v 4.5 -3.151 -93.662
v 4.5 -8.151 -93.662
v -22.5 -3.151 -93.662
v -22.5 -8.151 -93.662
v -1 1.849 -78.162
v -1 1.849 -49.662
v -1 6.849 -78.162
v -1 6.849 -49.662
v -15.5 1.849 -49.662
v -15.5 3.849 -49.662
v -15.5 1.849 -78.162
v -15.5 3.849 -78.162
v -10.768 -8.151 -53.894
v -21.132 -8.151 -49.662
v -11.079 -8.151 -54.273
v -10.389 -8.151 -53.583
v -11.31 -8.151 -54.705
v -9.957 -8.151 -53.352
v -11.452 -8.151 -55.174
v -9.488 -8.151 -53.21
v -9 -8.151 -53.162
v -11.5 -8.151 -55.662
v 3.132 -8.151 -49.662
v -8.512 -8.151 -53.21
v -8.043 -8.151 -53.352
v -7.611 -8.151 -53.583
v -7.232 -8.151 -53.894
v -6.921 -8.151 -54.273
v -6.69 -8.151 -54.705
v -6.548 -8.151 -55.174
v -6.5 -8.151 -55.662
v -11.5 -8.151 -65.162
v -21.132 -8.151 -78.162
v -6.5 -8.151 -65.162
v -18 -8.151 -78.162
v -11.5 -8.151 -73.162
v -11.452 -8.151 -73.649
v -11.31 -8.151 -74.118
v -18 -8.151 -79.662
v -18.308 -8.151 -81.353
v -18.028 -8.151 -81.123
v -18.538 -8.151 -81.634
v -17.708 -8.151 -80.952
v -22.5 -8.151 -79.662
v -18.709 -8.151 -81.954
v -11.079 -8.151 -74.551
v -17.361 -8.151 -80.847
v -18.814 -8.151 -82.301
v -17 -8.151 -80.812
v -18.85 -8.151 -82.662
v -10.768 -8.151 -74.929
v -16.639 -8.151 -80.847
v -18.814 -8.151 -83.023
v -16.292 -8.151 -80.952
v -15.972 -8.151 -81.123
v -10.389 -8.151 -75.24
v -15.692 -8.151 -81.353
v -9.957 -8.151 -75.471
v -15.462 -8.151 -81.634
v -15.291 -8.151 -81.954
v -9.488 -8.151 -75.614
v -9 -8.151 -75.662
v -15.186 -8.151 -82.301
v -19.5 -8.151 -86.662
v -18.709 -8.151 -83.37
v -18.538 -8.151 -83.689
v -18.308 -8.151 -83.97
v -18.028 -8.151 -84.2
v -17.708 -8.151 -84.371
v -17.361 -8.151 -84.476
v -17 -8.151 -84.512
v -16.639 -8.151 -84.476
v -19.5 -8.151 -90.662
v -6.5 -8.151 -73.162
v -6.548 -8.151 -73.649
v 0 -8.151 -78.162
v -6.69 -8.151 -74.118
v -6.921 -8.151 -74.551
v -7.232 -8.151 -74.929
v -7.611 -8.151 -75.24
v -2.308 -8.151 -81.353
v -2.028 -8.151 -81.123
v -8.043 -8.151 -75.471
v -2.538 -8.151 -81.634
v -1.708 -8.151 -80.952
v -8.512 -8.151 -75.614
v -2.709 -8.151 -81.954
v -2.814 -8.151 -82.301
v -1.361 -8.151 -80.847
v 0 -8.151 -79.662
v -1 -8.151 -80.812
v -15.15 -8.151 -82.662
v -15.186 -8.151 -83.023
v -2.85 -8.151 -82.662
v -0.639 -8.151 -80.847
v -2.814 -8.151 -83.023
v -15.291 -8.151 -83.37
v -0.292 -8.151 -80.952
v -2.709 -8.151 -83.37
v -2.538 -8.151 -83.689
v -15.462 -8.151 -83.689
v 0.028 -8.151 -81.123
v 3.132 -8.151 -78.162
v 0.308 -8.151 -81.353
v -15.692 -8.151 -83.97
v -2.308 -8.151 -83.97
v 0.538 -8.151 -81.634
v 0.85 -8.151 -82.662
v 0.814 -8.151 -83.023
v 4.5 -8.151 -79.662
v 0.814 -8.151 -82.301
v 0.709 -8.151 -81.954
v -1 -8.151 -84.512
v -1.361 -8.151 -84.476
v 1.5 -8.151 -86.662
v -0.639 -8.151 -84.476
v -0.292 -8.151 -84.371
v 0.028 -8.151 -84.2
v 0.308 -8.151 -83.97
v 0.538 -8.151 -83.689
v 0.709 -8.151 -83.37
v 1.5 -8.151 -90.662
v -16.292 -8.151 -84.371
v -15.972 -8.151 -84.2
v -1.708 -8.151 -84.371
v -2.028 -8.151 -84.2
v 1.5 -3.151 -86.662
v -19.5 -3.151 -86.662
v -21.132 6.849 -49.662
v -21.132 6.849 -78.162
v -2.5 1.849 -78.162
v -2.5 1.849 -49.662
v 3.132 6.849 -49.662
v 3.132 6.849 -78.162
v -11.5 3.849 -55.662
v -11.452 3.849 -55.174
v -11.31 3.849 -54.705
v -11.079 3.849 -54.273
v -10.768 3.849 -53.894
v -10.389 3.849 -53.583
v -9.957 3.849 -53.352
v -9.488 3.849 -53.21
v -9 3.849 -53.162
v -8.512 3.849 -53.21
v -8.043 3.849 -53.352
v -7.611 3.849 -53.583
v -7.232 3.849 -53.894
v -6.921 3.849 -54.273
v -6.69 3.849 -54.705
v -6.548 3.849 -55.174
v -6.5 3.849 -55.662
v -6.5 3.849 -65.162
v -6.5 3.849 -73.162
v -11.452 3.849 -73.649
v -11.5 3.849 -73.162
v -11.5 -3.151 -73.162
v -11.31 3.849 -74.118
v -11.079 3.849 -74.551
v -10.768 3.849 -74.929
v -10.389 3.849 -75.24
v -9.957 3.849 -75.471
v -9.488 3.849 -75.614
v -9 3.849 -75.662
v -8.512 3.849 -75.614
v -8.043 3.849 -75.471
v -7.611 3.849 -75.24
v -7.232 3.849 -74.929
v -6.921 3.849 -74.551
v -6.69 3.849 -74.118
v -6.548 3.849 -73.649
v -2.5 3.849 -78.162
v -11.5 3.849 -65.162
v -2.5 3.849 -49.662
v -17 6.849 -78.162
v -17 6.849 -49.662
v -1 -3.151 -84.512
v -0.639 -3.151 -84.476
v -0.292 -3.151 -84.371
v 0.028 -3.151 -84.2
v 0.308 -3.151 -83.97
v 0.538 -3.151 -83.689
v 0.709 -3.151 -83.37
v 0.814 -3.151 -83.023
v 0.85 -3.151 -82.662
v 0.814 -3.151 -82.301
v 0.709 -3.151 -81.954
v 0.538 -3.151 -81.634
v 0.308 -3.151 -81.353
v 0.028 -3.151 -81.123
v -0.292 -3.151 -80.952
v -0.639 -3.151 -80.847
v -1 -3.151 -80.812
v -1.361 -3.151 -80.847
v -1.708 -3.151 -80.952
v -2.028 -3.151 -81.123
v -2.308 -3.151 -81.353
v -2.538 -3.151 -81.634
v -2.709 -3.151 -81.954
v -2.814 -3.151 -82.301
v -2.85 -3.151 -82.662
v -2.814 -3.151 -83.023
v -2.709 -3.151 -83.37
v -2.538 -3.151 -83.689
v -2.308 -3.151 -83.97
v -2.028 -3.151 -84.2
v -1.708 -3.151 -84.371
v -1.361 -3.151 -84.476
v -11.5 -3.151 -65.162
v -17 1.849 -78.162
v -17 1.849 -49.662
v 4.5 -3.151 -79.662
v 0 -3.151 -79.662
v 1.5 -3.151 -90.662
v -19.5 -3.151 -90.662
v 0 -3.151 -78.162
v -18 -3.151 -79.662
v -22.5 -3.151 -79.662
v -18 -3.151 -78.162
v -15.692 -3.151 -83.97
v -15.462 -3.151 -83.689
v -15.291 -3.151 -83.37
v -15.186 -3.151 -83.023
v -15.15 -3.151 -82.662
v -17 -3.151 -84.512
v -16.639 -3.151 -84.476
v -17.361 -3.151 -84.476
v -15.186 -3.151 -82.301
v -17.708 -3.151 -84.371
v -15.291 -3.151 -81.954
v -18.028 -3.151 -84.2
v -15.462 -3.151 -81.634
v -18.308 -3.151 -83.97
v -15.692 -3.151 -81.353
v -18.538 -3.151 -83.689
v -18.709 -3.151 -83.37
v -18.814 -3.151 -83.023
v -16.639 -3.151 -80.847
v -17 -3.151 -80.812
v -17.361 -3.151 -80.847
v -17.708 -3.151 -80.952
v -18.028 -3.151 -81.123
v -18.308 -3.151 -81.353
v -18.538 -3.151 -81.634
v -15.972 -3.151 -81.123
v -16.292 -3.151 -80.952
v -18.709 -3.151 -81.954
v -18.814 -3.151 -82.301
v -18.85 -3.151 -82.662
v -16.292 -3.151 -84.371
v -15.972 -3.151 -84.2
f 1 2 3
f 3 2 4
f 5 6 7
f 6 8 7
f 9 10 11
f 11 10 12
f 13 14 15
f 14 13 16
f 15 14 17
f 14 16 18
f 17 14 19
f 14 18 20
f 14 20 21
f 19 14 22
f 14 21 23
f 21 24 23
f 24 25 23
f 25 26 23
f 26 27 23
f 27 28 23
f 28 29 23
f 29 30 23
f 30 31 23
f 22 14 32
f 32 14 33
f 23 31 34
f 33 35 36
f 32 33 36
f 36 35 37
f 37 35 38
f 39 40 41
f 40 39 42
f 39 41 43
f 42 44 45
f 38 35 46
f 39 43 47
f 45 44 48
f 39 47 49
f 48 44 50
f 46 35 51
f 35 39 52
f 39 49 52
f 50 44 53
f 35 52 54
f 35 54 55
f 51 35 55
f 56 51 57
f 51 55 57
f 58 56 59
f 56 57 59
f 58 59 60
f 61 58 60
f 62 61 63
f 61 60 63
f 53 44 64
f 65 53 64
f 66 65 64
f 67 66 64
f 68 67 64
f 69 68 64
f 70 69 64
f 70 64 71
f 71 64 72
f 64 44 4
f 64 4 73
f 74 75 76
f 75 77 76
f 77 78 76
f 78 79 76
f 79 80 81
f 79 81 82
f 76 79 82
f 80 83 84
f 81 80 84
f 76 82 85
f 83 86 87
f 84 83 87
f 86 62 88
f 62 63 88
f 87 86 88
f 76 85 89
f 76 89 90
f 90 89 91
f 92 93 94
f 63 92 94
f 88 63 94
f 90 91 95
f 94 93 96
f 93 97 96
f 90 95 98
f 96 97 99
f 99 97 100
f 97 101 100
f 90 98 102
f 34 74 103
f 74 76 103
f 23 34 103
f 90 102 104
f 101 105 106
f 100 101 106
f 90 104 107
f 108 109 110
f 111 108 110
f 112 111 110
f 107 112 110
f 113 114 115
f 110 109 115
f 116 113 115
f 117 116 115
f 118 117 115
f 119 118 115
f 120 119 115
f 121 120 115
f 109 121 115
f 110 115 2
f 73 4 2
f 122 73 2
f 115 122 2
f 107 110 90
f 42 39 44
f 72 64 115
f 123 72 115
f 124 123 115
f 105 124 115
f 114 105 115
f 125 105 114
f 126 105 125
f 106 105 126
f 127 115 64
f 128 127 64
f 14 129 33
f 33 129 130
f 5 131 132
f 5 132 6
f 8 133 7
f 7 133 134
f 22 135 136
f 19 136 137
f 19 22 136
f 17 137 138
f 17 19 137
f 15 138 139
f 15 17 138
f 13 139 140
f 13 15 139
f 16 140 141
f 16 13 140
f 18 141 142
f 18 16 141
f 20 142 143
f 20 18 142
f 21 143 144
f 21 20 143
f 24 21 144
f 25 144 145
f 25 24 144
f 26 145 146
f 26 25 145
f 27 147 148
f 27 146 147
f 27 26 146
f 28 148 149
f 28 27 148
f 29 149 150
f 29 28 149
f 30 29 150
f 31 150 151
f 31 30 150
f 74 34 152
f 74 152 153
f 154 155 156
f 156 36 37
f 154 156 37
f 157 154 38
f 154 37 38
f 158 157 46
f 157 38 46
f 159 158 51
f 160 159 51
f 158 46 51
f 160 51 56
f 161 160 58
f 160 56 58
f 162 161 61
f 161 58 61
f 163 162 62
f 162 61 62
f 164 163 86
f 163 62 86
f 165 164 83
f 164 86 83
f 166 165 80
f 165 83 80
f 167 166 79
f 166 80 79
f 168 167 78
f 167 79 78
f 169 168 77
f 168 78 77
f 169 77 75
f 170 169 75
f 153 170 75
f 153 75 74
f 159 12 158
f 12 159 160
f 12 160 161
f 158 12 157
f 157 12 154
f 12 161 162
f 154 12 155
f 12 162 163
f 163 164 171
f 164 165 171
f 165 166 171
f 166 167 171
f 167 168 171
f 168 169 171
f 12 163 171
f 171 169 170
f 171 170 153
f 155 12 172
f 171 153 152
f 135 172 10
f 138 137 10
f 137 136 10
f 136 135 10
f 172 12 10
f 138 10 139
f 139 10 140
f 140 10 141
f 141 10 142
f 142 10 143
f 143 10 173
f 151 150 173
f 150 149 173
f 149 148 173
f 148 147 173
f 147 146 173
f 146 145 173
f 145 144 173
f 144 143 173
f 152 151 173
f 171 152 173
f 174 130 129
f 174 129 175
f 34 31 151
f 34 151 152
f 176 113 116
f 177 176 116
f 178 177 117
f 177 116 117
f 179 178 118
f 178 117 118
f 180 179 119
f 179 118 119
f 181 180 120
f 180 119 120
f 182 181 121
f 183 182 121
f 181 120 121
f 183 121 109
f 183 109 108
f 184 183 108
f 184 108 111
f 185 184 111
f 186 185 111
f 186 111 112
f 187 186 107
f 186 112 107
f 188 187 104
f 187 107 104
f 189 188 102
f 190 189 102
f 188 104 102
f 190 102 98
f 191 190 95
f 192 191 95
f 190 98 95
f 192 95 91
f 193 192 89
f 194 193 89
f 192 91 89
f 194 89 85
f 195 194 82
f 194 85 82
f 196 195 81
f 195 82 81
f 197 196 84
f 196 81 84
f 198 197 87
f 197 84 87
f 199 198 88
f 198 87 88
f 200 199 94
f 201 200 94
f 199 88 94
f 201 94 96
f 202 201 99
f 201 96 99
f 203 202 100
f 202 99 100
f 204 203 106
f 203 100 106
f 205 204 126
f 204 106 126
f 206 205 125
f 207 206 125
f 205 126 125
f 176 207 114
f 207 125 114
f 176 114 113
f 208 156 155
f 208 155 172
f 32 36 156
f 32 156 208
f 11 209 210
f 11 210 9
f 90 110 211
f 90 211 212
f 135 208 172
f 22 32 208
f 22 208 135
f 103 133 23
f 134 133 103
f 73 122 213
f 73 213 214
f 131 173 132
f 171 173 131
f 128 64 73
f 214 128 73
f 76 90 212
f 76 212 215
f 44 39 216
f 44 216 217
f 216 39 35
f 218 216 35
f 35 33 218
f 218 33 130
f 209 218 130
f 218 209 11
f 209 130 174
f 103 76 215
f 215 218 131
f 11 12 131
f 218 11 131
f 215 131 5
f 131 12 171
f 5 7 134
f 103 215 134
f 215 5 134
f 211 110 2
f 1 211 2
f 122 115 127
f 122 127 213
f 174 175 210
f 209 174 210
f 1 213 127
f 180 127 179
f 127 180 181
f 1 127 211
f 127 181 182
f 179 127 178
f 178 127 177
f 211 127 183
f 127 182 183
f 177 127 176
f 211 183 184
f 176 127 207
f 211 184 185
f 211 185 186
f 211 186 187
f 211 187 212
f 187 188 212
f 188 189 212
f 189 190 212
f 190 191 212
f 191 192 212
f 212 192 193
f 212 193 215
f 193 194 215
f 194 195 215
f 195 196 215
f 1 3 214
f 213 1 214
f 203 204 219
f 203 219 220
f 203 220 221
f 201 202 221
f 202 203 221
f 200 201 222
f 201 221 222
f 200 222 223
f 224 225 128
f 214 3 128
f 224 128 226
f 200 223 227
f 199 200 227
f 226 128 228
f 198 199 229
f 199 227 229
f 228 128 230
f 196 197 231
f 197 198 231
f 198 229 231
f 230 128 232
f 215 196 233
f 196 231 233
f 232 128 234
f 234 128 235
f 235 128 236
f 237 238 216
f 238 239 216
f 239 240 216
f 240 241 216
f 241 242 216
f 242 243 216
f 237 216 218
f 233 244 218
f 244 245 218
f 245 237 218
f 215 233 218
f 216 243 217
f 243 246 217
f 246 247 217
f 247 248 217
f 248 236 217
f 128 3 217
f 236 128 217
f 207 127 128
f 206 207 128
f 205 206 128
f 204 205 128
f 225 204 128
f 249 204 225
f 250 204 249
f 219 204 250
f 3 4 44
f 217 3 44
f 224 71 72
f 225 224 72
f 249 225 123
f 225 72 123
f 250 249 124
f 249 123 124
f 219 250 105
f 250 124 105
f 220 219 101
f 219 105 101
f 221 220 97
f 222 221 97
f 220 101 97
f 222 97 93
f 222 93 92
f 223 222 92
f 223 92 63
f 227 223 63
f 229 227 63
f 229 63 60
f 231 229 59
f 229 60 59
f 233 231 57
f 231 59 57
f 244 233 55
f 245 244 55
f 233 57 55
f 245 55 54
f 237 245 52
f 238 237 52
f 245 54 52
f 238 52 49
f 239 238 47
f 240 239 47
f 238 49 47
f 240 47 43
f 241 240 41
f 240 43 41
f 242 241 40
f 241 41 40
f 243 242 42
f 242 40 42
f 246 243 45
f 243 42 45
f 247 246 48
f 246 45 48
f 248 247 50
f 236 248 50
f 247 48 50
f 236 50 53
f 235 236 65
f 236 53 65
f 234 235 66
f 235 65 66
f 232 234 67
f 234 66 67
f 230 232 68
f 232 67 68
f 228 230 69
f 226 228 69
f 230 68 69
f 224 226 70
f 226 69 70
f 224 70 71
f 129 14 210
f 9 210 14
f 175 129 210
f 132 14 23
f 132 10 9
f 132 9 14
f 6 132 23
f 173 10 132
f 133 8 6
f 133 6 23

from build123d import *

# Parameters (mm, degrees)
CROQUIS1_W                    = 30
CROQUIS1_H                    = 10
SALIENTE_EXTRUIR1_DEPTH       = 18
CROQUIS2_W                    = 16
CROQUIS2_H                    = 3
CORTAR_EXTRUIR1_DEPTH         = 39.831471343
DI_METRO_DE_TALADRO_5_0_5_1_D = 5
DI_METRO_DE_TALADRO_5_0_5_2_D = 5
SALIENTE_EXTRUIR2_START       = 5
CROQUIS7_W                    = 18
CROQUIS7_H                    = 30
CROQUIS7_R                    = 2.5
CROQUIS7_R_2                  = 1.85
SALIENTE_EXTRUIR2_DEPTH       = 5
CORTAR_EXTRUIR3_REACH         = 99.487
CROQUIS9_W                    = 21
CROQUIS9_H                    = 4
CORTAR_EXTRUIR4_REACH         = 98.671
CROQUIS12_W                   = 1.5
CROQUIS12_H                   = 10
CROQUIS11_W                   = 3.131833875
CROQUIS11_H                   = 28.5
SALIENTE_EXTRUIR4_DEPTH       = 15
CROQUIS13_W                   = 1.5
CROQUIS13_H                   = 28.5
CORTAR_EXTRUIR5_DEPTH         = 2
CORTAR_EXTRUIR6_START         = -12
CORTAR_EXTRUIR6_DEPTH         = 15


with BuildPart() as part:
    # Croquis1 → Saliente-Extruir1 (new body)
    with BuildSketch(Plane(origin=(0, 0, 0), x_dir=(0, 0, -1), z_dir=(1, 0, 0))):
        with Locations((64.661633078, 1.848832797)):
            Rectangle(CROQUIS1_W, CROQUIS1_H)
    extrude(amount=-SALIENTE_EXTRUIR1_DEPTH)

    # Croquis2 → Cortar-Extruir1 (cut, through all)
    with BuildSketch(Plane(origin=(0, 13.697665595, -49.661633078), x_dir=(1, 0, 0), z_dir=(0, 0, -1))):
        with Locations((-9, 8.348832797)):
            Rectangle(CROQUIS2_W, CROQUIS2_H)
    extrude(amount=CORTAR_EXTRUIR1_DEPTH, mode=Mode.SUBTRACT)

    # Diámetro de taladro Ø5.0 (5)1 (through all)
    with Locations(Plane(origin=(0, 3.848832797, 0), x_dir=(1, 0, 0), z_dir=(0, 1, 0))):
        with Locations((-9, 65.161633078)):
            Hole(DI_METRO_DE_TALADRO_5_0_5_1_D / 2)

    # Diámetro de taladro Ø5.0 (5)2 (through all)
    with Locations(Plane(origin=(0, 3.848832797, 0), x_dir=(1, 0, 0), z_dir=(0, 1, 0))):
        with Locations((-9, 73.161633078)):
            Hole(DI_METRO_DE_TALADRO_5_0_5_2_D / 2)

    # Croquis7 → Saliente-Extruir2 (add)
    # profile 1 of 2: a face of its own
    with BuildSketch(Plane.XZ.offset(3.151167203).offset(SALIENTE_EXTRUIR2_START)):
        with Locations((-9, -64.661633078)):
            Rectangle(CROQUIS7_W, CROQUIS7_H)
        with Locations(Location((-9, -65.161633078, 0), (0, 0, 90))):
            Circle(CROQUIS7_R, mode=Mode.SUBTRACT)
        with Locations(Location((-9, -73.161633078, 0), (0, 0, 90))):
            Circle(CROQUIS7_R, mode=Mode.SUBTRACT)
    # profile 2 of 2: a face of its own
    with BuildSketch(Plane.XZ.offset(3.151167203).offset(SALIENTE_EXTRUIR2_START)):
        Polygon((0, -79.661633078), (4.5, -79.661633078), (4.5, -93.661633078), (-22.5, -93.661633078), (-22.5, -79.661633078), (-18, -79.661633078), align=None)
        with Locations(Location((-17, -82.661633078, 0), (0, 0, 270))):
            Circle(CROQUIS7_R_2, mode=Mode.SUBTRACT)
        with Locations(Location((-1, -82.661633078, 0), (0, 0, 270))):
            Circle(CROQUIS7_R_2, mode=Mode.SUBTRACT)
    extrude(amount=-SALIENTE_EXTRUIR2_DEPTH)

    # Croquis9 → Cortar-Extruir3 (cut, up to next)
    with BuildSketch(Plane(origin=(0, -8.151167203, 0), x_dir=(-1, 0, 0), z_dir=(0, -1, 0)), mode=Mode.PRIVATE) as cortar_extruir3_sk1:
        with Locations((9, 88.661633078)):
            Rectangle(CROQUIS9_W, CROQUIS9_H)
    cortar_extruir3_tool1 = extrude(cortar_extruir3_sk1.sketch, amount=-CORTAR_EXTRUIR3_REACH, mode=Mode.PRIVATE) & part.part
    add(cortar_extruir3_tool1.solids().sort_by_distance((-9, -8.151167, -88.661633))[0], mode=Mode.SUBTRACT)

    # Croquis12 → Cortar-Extruir4 (cut, up to next)
    with BuildSketch(Plane.ZY.offset(18), mode=Mode.PRIVATE) as cortar_extruir4_sk1:
        with Locations((-78.911633078, 1.848832797)):
            Rectangle(CROQUIS12_W, CROQUIS12_H)
    cortar_extruir4_tool1 = extrude(cortar_extruir4_sk1.sketch, amount=-CORTAR_EXTRUIR4_REACH, mode=Mode.PRIVATE) & part.part
    add(cortar_extruir4_tool1.solids().sort_by_distance((-18, 1.848833, -78.911633))[0], mode=Mode.SUBTRACT)

    # Croquis11 → Saliente-Extruir4 (add)
    with BuildSketch(Plane(origin=(0, 6.848832797, 0), x_dir=(1, 0, 0), z_dir=(0, 1, 0))):
        with Locations((-19.565916937, 63.911633078)):
            Rectangle(CROQUIS11_W, CROQUIS11_H)
        with Locations((1.565916938, 63.911633078)):
            Rectangle(CROQUIS11_W, CROQUIS11_H)
    extrude(amount=-SALIENTE_EXTRUIR4_DEPTH)

    # Croquis13 → Cortar-Extruir5 (cut)
    with BuildSketch(Plane(origin=(0, 3.848832797, 0), x_dir=(1, 0, 0), z_dir=(0, 1, 0))):
        with Locations((-16.25, 63.911633078)):
            Rectangle(CROQUIS13_W, CROQUIS13_H)
        with Locations((-1.75, 63.911633078)):
            Rectangle(CROQUIS13_W, CROQUIS13_H)
    extrude(amount=-CORTAR_EXTRUIR5_DEPTH, mode=Mode.SUBTRACT)

    # Croquis14 → Cortar-Extruir6 (cut)
    with BuildSketch(Plane(origin=(0, 3.848832797, 0), x_dir=(1, 0, 0), z_dir=(0, 1, 0)).offset(CORTAR_EXTRUIR6_START)):
        with BuildLine():
            Line((-6.5, 55.661633078), (-6.5, 73.161633078))
            ThreePointArc((-6.5, 73.161633078), (-9, 75.661633078), (-11.5, 73.161633078))
            Line((-11.5, 73.161633078), (-11.5, 55.661633078))
            ThreePointArc((-11.5, 55.661633078), (-9, 53.161633078), (-6.5, 55.661633078))
        make_face()
    extrude(amount=CORTAR_EXTRUIR6_DEPTH, mode=Mode.SUBTRACT)


solid = part.part
